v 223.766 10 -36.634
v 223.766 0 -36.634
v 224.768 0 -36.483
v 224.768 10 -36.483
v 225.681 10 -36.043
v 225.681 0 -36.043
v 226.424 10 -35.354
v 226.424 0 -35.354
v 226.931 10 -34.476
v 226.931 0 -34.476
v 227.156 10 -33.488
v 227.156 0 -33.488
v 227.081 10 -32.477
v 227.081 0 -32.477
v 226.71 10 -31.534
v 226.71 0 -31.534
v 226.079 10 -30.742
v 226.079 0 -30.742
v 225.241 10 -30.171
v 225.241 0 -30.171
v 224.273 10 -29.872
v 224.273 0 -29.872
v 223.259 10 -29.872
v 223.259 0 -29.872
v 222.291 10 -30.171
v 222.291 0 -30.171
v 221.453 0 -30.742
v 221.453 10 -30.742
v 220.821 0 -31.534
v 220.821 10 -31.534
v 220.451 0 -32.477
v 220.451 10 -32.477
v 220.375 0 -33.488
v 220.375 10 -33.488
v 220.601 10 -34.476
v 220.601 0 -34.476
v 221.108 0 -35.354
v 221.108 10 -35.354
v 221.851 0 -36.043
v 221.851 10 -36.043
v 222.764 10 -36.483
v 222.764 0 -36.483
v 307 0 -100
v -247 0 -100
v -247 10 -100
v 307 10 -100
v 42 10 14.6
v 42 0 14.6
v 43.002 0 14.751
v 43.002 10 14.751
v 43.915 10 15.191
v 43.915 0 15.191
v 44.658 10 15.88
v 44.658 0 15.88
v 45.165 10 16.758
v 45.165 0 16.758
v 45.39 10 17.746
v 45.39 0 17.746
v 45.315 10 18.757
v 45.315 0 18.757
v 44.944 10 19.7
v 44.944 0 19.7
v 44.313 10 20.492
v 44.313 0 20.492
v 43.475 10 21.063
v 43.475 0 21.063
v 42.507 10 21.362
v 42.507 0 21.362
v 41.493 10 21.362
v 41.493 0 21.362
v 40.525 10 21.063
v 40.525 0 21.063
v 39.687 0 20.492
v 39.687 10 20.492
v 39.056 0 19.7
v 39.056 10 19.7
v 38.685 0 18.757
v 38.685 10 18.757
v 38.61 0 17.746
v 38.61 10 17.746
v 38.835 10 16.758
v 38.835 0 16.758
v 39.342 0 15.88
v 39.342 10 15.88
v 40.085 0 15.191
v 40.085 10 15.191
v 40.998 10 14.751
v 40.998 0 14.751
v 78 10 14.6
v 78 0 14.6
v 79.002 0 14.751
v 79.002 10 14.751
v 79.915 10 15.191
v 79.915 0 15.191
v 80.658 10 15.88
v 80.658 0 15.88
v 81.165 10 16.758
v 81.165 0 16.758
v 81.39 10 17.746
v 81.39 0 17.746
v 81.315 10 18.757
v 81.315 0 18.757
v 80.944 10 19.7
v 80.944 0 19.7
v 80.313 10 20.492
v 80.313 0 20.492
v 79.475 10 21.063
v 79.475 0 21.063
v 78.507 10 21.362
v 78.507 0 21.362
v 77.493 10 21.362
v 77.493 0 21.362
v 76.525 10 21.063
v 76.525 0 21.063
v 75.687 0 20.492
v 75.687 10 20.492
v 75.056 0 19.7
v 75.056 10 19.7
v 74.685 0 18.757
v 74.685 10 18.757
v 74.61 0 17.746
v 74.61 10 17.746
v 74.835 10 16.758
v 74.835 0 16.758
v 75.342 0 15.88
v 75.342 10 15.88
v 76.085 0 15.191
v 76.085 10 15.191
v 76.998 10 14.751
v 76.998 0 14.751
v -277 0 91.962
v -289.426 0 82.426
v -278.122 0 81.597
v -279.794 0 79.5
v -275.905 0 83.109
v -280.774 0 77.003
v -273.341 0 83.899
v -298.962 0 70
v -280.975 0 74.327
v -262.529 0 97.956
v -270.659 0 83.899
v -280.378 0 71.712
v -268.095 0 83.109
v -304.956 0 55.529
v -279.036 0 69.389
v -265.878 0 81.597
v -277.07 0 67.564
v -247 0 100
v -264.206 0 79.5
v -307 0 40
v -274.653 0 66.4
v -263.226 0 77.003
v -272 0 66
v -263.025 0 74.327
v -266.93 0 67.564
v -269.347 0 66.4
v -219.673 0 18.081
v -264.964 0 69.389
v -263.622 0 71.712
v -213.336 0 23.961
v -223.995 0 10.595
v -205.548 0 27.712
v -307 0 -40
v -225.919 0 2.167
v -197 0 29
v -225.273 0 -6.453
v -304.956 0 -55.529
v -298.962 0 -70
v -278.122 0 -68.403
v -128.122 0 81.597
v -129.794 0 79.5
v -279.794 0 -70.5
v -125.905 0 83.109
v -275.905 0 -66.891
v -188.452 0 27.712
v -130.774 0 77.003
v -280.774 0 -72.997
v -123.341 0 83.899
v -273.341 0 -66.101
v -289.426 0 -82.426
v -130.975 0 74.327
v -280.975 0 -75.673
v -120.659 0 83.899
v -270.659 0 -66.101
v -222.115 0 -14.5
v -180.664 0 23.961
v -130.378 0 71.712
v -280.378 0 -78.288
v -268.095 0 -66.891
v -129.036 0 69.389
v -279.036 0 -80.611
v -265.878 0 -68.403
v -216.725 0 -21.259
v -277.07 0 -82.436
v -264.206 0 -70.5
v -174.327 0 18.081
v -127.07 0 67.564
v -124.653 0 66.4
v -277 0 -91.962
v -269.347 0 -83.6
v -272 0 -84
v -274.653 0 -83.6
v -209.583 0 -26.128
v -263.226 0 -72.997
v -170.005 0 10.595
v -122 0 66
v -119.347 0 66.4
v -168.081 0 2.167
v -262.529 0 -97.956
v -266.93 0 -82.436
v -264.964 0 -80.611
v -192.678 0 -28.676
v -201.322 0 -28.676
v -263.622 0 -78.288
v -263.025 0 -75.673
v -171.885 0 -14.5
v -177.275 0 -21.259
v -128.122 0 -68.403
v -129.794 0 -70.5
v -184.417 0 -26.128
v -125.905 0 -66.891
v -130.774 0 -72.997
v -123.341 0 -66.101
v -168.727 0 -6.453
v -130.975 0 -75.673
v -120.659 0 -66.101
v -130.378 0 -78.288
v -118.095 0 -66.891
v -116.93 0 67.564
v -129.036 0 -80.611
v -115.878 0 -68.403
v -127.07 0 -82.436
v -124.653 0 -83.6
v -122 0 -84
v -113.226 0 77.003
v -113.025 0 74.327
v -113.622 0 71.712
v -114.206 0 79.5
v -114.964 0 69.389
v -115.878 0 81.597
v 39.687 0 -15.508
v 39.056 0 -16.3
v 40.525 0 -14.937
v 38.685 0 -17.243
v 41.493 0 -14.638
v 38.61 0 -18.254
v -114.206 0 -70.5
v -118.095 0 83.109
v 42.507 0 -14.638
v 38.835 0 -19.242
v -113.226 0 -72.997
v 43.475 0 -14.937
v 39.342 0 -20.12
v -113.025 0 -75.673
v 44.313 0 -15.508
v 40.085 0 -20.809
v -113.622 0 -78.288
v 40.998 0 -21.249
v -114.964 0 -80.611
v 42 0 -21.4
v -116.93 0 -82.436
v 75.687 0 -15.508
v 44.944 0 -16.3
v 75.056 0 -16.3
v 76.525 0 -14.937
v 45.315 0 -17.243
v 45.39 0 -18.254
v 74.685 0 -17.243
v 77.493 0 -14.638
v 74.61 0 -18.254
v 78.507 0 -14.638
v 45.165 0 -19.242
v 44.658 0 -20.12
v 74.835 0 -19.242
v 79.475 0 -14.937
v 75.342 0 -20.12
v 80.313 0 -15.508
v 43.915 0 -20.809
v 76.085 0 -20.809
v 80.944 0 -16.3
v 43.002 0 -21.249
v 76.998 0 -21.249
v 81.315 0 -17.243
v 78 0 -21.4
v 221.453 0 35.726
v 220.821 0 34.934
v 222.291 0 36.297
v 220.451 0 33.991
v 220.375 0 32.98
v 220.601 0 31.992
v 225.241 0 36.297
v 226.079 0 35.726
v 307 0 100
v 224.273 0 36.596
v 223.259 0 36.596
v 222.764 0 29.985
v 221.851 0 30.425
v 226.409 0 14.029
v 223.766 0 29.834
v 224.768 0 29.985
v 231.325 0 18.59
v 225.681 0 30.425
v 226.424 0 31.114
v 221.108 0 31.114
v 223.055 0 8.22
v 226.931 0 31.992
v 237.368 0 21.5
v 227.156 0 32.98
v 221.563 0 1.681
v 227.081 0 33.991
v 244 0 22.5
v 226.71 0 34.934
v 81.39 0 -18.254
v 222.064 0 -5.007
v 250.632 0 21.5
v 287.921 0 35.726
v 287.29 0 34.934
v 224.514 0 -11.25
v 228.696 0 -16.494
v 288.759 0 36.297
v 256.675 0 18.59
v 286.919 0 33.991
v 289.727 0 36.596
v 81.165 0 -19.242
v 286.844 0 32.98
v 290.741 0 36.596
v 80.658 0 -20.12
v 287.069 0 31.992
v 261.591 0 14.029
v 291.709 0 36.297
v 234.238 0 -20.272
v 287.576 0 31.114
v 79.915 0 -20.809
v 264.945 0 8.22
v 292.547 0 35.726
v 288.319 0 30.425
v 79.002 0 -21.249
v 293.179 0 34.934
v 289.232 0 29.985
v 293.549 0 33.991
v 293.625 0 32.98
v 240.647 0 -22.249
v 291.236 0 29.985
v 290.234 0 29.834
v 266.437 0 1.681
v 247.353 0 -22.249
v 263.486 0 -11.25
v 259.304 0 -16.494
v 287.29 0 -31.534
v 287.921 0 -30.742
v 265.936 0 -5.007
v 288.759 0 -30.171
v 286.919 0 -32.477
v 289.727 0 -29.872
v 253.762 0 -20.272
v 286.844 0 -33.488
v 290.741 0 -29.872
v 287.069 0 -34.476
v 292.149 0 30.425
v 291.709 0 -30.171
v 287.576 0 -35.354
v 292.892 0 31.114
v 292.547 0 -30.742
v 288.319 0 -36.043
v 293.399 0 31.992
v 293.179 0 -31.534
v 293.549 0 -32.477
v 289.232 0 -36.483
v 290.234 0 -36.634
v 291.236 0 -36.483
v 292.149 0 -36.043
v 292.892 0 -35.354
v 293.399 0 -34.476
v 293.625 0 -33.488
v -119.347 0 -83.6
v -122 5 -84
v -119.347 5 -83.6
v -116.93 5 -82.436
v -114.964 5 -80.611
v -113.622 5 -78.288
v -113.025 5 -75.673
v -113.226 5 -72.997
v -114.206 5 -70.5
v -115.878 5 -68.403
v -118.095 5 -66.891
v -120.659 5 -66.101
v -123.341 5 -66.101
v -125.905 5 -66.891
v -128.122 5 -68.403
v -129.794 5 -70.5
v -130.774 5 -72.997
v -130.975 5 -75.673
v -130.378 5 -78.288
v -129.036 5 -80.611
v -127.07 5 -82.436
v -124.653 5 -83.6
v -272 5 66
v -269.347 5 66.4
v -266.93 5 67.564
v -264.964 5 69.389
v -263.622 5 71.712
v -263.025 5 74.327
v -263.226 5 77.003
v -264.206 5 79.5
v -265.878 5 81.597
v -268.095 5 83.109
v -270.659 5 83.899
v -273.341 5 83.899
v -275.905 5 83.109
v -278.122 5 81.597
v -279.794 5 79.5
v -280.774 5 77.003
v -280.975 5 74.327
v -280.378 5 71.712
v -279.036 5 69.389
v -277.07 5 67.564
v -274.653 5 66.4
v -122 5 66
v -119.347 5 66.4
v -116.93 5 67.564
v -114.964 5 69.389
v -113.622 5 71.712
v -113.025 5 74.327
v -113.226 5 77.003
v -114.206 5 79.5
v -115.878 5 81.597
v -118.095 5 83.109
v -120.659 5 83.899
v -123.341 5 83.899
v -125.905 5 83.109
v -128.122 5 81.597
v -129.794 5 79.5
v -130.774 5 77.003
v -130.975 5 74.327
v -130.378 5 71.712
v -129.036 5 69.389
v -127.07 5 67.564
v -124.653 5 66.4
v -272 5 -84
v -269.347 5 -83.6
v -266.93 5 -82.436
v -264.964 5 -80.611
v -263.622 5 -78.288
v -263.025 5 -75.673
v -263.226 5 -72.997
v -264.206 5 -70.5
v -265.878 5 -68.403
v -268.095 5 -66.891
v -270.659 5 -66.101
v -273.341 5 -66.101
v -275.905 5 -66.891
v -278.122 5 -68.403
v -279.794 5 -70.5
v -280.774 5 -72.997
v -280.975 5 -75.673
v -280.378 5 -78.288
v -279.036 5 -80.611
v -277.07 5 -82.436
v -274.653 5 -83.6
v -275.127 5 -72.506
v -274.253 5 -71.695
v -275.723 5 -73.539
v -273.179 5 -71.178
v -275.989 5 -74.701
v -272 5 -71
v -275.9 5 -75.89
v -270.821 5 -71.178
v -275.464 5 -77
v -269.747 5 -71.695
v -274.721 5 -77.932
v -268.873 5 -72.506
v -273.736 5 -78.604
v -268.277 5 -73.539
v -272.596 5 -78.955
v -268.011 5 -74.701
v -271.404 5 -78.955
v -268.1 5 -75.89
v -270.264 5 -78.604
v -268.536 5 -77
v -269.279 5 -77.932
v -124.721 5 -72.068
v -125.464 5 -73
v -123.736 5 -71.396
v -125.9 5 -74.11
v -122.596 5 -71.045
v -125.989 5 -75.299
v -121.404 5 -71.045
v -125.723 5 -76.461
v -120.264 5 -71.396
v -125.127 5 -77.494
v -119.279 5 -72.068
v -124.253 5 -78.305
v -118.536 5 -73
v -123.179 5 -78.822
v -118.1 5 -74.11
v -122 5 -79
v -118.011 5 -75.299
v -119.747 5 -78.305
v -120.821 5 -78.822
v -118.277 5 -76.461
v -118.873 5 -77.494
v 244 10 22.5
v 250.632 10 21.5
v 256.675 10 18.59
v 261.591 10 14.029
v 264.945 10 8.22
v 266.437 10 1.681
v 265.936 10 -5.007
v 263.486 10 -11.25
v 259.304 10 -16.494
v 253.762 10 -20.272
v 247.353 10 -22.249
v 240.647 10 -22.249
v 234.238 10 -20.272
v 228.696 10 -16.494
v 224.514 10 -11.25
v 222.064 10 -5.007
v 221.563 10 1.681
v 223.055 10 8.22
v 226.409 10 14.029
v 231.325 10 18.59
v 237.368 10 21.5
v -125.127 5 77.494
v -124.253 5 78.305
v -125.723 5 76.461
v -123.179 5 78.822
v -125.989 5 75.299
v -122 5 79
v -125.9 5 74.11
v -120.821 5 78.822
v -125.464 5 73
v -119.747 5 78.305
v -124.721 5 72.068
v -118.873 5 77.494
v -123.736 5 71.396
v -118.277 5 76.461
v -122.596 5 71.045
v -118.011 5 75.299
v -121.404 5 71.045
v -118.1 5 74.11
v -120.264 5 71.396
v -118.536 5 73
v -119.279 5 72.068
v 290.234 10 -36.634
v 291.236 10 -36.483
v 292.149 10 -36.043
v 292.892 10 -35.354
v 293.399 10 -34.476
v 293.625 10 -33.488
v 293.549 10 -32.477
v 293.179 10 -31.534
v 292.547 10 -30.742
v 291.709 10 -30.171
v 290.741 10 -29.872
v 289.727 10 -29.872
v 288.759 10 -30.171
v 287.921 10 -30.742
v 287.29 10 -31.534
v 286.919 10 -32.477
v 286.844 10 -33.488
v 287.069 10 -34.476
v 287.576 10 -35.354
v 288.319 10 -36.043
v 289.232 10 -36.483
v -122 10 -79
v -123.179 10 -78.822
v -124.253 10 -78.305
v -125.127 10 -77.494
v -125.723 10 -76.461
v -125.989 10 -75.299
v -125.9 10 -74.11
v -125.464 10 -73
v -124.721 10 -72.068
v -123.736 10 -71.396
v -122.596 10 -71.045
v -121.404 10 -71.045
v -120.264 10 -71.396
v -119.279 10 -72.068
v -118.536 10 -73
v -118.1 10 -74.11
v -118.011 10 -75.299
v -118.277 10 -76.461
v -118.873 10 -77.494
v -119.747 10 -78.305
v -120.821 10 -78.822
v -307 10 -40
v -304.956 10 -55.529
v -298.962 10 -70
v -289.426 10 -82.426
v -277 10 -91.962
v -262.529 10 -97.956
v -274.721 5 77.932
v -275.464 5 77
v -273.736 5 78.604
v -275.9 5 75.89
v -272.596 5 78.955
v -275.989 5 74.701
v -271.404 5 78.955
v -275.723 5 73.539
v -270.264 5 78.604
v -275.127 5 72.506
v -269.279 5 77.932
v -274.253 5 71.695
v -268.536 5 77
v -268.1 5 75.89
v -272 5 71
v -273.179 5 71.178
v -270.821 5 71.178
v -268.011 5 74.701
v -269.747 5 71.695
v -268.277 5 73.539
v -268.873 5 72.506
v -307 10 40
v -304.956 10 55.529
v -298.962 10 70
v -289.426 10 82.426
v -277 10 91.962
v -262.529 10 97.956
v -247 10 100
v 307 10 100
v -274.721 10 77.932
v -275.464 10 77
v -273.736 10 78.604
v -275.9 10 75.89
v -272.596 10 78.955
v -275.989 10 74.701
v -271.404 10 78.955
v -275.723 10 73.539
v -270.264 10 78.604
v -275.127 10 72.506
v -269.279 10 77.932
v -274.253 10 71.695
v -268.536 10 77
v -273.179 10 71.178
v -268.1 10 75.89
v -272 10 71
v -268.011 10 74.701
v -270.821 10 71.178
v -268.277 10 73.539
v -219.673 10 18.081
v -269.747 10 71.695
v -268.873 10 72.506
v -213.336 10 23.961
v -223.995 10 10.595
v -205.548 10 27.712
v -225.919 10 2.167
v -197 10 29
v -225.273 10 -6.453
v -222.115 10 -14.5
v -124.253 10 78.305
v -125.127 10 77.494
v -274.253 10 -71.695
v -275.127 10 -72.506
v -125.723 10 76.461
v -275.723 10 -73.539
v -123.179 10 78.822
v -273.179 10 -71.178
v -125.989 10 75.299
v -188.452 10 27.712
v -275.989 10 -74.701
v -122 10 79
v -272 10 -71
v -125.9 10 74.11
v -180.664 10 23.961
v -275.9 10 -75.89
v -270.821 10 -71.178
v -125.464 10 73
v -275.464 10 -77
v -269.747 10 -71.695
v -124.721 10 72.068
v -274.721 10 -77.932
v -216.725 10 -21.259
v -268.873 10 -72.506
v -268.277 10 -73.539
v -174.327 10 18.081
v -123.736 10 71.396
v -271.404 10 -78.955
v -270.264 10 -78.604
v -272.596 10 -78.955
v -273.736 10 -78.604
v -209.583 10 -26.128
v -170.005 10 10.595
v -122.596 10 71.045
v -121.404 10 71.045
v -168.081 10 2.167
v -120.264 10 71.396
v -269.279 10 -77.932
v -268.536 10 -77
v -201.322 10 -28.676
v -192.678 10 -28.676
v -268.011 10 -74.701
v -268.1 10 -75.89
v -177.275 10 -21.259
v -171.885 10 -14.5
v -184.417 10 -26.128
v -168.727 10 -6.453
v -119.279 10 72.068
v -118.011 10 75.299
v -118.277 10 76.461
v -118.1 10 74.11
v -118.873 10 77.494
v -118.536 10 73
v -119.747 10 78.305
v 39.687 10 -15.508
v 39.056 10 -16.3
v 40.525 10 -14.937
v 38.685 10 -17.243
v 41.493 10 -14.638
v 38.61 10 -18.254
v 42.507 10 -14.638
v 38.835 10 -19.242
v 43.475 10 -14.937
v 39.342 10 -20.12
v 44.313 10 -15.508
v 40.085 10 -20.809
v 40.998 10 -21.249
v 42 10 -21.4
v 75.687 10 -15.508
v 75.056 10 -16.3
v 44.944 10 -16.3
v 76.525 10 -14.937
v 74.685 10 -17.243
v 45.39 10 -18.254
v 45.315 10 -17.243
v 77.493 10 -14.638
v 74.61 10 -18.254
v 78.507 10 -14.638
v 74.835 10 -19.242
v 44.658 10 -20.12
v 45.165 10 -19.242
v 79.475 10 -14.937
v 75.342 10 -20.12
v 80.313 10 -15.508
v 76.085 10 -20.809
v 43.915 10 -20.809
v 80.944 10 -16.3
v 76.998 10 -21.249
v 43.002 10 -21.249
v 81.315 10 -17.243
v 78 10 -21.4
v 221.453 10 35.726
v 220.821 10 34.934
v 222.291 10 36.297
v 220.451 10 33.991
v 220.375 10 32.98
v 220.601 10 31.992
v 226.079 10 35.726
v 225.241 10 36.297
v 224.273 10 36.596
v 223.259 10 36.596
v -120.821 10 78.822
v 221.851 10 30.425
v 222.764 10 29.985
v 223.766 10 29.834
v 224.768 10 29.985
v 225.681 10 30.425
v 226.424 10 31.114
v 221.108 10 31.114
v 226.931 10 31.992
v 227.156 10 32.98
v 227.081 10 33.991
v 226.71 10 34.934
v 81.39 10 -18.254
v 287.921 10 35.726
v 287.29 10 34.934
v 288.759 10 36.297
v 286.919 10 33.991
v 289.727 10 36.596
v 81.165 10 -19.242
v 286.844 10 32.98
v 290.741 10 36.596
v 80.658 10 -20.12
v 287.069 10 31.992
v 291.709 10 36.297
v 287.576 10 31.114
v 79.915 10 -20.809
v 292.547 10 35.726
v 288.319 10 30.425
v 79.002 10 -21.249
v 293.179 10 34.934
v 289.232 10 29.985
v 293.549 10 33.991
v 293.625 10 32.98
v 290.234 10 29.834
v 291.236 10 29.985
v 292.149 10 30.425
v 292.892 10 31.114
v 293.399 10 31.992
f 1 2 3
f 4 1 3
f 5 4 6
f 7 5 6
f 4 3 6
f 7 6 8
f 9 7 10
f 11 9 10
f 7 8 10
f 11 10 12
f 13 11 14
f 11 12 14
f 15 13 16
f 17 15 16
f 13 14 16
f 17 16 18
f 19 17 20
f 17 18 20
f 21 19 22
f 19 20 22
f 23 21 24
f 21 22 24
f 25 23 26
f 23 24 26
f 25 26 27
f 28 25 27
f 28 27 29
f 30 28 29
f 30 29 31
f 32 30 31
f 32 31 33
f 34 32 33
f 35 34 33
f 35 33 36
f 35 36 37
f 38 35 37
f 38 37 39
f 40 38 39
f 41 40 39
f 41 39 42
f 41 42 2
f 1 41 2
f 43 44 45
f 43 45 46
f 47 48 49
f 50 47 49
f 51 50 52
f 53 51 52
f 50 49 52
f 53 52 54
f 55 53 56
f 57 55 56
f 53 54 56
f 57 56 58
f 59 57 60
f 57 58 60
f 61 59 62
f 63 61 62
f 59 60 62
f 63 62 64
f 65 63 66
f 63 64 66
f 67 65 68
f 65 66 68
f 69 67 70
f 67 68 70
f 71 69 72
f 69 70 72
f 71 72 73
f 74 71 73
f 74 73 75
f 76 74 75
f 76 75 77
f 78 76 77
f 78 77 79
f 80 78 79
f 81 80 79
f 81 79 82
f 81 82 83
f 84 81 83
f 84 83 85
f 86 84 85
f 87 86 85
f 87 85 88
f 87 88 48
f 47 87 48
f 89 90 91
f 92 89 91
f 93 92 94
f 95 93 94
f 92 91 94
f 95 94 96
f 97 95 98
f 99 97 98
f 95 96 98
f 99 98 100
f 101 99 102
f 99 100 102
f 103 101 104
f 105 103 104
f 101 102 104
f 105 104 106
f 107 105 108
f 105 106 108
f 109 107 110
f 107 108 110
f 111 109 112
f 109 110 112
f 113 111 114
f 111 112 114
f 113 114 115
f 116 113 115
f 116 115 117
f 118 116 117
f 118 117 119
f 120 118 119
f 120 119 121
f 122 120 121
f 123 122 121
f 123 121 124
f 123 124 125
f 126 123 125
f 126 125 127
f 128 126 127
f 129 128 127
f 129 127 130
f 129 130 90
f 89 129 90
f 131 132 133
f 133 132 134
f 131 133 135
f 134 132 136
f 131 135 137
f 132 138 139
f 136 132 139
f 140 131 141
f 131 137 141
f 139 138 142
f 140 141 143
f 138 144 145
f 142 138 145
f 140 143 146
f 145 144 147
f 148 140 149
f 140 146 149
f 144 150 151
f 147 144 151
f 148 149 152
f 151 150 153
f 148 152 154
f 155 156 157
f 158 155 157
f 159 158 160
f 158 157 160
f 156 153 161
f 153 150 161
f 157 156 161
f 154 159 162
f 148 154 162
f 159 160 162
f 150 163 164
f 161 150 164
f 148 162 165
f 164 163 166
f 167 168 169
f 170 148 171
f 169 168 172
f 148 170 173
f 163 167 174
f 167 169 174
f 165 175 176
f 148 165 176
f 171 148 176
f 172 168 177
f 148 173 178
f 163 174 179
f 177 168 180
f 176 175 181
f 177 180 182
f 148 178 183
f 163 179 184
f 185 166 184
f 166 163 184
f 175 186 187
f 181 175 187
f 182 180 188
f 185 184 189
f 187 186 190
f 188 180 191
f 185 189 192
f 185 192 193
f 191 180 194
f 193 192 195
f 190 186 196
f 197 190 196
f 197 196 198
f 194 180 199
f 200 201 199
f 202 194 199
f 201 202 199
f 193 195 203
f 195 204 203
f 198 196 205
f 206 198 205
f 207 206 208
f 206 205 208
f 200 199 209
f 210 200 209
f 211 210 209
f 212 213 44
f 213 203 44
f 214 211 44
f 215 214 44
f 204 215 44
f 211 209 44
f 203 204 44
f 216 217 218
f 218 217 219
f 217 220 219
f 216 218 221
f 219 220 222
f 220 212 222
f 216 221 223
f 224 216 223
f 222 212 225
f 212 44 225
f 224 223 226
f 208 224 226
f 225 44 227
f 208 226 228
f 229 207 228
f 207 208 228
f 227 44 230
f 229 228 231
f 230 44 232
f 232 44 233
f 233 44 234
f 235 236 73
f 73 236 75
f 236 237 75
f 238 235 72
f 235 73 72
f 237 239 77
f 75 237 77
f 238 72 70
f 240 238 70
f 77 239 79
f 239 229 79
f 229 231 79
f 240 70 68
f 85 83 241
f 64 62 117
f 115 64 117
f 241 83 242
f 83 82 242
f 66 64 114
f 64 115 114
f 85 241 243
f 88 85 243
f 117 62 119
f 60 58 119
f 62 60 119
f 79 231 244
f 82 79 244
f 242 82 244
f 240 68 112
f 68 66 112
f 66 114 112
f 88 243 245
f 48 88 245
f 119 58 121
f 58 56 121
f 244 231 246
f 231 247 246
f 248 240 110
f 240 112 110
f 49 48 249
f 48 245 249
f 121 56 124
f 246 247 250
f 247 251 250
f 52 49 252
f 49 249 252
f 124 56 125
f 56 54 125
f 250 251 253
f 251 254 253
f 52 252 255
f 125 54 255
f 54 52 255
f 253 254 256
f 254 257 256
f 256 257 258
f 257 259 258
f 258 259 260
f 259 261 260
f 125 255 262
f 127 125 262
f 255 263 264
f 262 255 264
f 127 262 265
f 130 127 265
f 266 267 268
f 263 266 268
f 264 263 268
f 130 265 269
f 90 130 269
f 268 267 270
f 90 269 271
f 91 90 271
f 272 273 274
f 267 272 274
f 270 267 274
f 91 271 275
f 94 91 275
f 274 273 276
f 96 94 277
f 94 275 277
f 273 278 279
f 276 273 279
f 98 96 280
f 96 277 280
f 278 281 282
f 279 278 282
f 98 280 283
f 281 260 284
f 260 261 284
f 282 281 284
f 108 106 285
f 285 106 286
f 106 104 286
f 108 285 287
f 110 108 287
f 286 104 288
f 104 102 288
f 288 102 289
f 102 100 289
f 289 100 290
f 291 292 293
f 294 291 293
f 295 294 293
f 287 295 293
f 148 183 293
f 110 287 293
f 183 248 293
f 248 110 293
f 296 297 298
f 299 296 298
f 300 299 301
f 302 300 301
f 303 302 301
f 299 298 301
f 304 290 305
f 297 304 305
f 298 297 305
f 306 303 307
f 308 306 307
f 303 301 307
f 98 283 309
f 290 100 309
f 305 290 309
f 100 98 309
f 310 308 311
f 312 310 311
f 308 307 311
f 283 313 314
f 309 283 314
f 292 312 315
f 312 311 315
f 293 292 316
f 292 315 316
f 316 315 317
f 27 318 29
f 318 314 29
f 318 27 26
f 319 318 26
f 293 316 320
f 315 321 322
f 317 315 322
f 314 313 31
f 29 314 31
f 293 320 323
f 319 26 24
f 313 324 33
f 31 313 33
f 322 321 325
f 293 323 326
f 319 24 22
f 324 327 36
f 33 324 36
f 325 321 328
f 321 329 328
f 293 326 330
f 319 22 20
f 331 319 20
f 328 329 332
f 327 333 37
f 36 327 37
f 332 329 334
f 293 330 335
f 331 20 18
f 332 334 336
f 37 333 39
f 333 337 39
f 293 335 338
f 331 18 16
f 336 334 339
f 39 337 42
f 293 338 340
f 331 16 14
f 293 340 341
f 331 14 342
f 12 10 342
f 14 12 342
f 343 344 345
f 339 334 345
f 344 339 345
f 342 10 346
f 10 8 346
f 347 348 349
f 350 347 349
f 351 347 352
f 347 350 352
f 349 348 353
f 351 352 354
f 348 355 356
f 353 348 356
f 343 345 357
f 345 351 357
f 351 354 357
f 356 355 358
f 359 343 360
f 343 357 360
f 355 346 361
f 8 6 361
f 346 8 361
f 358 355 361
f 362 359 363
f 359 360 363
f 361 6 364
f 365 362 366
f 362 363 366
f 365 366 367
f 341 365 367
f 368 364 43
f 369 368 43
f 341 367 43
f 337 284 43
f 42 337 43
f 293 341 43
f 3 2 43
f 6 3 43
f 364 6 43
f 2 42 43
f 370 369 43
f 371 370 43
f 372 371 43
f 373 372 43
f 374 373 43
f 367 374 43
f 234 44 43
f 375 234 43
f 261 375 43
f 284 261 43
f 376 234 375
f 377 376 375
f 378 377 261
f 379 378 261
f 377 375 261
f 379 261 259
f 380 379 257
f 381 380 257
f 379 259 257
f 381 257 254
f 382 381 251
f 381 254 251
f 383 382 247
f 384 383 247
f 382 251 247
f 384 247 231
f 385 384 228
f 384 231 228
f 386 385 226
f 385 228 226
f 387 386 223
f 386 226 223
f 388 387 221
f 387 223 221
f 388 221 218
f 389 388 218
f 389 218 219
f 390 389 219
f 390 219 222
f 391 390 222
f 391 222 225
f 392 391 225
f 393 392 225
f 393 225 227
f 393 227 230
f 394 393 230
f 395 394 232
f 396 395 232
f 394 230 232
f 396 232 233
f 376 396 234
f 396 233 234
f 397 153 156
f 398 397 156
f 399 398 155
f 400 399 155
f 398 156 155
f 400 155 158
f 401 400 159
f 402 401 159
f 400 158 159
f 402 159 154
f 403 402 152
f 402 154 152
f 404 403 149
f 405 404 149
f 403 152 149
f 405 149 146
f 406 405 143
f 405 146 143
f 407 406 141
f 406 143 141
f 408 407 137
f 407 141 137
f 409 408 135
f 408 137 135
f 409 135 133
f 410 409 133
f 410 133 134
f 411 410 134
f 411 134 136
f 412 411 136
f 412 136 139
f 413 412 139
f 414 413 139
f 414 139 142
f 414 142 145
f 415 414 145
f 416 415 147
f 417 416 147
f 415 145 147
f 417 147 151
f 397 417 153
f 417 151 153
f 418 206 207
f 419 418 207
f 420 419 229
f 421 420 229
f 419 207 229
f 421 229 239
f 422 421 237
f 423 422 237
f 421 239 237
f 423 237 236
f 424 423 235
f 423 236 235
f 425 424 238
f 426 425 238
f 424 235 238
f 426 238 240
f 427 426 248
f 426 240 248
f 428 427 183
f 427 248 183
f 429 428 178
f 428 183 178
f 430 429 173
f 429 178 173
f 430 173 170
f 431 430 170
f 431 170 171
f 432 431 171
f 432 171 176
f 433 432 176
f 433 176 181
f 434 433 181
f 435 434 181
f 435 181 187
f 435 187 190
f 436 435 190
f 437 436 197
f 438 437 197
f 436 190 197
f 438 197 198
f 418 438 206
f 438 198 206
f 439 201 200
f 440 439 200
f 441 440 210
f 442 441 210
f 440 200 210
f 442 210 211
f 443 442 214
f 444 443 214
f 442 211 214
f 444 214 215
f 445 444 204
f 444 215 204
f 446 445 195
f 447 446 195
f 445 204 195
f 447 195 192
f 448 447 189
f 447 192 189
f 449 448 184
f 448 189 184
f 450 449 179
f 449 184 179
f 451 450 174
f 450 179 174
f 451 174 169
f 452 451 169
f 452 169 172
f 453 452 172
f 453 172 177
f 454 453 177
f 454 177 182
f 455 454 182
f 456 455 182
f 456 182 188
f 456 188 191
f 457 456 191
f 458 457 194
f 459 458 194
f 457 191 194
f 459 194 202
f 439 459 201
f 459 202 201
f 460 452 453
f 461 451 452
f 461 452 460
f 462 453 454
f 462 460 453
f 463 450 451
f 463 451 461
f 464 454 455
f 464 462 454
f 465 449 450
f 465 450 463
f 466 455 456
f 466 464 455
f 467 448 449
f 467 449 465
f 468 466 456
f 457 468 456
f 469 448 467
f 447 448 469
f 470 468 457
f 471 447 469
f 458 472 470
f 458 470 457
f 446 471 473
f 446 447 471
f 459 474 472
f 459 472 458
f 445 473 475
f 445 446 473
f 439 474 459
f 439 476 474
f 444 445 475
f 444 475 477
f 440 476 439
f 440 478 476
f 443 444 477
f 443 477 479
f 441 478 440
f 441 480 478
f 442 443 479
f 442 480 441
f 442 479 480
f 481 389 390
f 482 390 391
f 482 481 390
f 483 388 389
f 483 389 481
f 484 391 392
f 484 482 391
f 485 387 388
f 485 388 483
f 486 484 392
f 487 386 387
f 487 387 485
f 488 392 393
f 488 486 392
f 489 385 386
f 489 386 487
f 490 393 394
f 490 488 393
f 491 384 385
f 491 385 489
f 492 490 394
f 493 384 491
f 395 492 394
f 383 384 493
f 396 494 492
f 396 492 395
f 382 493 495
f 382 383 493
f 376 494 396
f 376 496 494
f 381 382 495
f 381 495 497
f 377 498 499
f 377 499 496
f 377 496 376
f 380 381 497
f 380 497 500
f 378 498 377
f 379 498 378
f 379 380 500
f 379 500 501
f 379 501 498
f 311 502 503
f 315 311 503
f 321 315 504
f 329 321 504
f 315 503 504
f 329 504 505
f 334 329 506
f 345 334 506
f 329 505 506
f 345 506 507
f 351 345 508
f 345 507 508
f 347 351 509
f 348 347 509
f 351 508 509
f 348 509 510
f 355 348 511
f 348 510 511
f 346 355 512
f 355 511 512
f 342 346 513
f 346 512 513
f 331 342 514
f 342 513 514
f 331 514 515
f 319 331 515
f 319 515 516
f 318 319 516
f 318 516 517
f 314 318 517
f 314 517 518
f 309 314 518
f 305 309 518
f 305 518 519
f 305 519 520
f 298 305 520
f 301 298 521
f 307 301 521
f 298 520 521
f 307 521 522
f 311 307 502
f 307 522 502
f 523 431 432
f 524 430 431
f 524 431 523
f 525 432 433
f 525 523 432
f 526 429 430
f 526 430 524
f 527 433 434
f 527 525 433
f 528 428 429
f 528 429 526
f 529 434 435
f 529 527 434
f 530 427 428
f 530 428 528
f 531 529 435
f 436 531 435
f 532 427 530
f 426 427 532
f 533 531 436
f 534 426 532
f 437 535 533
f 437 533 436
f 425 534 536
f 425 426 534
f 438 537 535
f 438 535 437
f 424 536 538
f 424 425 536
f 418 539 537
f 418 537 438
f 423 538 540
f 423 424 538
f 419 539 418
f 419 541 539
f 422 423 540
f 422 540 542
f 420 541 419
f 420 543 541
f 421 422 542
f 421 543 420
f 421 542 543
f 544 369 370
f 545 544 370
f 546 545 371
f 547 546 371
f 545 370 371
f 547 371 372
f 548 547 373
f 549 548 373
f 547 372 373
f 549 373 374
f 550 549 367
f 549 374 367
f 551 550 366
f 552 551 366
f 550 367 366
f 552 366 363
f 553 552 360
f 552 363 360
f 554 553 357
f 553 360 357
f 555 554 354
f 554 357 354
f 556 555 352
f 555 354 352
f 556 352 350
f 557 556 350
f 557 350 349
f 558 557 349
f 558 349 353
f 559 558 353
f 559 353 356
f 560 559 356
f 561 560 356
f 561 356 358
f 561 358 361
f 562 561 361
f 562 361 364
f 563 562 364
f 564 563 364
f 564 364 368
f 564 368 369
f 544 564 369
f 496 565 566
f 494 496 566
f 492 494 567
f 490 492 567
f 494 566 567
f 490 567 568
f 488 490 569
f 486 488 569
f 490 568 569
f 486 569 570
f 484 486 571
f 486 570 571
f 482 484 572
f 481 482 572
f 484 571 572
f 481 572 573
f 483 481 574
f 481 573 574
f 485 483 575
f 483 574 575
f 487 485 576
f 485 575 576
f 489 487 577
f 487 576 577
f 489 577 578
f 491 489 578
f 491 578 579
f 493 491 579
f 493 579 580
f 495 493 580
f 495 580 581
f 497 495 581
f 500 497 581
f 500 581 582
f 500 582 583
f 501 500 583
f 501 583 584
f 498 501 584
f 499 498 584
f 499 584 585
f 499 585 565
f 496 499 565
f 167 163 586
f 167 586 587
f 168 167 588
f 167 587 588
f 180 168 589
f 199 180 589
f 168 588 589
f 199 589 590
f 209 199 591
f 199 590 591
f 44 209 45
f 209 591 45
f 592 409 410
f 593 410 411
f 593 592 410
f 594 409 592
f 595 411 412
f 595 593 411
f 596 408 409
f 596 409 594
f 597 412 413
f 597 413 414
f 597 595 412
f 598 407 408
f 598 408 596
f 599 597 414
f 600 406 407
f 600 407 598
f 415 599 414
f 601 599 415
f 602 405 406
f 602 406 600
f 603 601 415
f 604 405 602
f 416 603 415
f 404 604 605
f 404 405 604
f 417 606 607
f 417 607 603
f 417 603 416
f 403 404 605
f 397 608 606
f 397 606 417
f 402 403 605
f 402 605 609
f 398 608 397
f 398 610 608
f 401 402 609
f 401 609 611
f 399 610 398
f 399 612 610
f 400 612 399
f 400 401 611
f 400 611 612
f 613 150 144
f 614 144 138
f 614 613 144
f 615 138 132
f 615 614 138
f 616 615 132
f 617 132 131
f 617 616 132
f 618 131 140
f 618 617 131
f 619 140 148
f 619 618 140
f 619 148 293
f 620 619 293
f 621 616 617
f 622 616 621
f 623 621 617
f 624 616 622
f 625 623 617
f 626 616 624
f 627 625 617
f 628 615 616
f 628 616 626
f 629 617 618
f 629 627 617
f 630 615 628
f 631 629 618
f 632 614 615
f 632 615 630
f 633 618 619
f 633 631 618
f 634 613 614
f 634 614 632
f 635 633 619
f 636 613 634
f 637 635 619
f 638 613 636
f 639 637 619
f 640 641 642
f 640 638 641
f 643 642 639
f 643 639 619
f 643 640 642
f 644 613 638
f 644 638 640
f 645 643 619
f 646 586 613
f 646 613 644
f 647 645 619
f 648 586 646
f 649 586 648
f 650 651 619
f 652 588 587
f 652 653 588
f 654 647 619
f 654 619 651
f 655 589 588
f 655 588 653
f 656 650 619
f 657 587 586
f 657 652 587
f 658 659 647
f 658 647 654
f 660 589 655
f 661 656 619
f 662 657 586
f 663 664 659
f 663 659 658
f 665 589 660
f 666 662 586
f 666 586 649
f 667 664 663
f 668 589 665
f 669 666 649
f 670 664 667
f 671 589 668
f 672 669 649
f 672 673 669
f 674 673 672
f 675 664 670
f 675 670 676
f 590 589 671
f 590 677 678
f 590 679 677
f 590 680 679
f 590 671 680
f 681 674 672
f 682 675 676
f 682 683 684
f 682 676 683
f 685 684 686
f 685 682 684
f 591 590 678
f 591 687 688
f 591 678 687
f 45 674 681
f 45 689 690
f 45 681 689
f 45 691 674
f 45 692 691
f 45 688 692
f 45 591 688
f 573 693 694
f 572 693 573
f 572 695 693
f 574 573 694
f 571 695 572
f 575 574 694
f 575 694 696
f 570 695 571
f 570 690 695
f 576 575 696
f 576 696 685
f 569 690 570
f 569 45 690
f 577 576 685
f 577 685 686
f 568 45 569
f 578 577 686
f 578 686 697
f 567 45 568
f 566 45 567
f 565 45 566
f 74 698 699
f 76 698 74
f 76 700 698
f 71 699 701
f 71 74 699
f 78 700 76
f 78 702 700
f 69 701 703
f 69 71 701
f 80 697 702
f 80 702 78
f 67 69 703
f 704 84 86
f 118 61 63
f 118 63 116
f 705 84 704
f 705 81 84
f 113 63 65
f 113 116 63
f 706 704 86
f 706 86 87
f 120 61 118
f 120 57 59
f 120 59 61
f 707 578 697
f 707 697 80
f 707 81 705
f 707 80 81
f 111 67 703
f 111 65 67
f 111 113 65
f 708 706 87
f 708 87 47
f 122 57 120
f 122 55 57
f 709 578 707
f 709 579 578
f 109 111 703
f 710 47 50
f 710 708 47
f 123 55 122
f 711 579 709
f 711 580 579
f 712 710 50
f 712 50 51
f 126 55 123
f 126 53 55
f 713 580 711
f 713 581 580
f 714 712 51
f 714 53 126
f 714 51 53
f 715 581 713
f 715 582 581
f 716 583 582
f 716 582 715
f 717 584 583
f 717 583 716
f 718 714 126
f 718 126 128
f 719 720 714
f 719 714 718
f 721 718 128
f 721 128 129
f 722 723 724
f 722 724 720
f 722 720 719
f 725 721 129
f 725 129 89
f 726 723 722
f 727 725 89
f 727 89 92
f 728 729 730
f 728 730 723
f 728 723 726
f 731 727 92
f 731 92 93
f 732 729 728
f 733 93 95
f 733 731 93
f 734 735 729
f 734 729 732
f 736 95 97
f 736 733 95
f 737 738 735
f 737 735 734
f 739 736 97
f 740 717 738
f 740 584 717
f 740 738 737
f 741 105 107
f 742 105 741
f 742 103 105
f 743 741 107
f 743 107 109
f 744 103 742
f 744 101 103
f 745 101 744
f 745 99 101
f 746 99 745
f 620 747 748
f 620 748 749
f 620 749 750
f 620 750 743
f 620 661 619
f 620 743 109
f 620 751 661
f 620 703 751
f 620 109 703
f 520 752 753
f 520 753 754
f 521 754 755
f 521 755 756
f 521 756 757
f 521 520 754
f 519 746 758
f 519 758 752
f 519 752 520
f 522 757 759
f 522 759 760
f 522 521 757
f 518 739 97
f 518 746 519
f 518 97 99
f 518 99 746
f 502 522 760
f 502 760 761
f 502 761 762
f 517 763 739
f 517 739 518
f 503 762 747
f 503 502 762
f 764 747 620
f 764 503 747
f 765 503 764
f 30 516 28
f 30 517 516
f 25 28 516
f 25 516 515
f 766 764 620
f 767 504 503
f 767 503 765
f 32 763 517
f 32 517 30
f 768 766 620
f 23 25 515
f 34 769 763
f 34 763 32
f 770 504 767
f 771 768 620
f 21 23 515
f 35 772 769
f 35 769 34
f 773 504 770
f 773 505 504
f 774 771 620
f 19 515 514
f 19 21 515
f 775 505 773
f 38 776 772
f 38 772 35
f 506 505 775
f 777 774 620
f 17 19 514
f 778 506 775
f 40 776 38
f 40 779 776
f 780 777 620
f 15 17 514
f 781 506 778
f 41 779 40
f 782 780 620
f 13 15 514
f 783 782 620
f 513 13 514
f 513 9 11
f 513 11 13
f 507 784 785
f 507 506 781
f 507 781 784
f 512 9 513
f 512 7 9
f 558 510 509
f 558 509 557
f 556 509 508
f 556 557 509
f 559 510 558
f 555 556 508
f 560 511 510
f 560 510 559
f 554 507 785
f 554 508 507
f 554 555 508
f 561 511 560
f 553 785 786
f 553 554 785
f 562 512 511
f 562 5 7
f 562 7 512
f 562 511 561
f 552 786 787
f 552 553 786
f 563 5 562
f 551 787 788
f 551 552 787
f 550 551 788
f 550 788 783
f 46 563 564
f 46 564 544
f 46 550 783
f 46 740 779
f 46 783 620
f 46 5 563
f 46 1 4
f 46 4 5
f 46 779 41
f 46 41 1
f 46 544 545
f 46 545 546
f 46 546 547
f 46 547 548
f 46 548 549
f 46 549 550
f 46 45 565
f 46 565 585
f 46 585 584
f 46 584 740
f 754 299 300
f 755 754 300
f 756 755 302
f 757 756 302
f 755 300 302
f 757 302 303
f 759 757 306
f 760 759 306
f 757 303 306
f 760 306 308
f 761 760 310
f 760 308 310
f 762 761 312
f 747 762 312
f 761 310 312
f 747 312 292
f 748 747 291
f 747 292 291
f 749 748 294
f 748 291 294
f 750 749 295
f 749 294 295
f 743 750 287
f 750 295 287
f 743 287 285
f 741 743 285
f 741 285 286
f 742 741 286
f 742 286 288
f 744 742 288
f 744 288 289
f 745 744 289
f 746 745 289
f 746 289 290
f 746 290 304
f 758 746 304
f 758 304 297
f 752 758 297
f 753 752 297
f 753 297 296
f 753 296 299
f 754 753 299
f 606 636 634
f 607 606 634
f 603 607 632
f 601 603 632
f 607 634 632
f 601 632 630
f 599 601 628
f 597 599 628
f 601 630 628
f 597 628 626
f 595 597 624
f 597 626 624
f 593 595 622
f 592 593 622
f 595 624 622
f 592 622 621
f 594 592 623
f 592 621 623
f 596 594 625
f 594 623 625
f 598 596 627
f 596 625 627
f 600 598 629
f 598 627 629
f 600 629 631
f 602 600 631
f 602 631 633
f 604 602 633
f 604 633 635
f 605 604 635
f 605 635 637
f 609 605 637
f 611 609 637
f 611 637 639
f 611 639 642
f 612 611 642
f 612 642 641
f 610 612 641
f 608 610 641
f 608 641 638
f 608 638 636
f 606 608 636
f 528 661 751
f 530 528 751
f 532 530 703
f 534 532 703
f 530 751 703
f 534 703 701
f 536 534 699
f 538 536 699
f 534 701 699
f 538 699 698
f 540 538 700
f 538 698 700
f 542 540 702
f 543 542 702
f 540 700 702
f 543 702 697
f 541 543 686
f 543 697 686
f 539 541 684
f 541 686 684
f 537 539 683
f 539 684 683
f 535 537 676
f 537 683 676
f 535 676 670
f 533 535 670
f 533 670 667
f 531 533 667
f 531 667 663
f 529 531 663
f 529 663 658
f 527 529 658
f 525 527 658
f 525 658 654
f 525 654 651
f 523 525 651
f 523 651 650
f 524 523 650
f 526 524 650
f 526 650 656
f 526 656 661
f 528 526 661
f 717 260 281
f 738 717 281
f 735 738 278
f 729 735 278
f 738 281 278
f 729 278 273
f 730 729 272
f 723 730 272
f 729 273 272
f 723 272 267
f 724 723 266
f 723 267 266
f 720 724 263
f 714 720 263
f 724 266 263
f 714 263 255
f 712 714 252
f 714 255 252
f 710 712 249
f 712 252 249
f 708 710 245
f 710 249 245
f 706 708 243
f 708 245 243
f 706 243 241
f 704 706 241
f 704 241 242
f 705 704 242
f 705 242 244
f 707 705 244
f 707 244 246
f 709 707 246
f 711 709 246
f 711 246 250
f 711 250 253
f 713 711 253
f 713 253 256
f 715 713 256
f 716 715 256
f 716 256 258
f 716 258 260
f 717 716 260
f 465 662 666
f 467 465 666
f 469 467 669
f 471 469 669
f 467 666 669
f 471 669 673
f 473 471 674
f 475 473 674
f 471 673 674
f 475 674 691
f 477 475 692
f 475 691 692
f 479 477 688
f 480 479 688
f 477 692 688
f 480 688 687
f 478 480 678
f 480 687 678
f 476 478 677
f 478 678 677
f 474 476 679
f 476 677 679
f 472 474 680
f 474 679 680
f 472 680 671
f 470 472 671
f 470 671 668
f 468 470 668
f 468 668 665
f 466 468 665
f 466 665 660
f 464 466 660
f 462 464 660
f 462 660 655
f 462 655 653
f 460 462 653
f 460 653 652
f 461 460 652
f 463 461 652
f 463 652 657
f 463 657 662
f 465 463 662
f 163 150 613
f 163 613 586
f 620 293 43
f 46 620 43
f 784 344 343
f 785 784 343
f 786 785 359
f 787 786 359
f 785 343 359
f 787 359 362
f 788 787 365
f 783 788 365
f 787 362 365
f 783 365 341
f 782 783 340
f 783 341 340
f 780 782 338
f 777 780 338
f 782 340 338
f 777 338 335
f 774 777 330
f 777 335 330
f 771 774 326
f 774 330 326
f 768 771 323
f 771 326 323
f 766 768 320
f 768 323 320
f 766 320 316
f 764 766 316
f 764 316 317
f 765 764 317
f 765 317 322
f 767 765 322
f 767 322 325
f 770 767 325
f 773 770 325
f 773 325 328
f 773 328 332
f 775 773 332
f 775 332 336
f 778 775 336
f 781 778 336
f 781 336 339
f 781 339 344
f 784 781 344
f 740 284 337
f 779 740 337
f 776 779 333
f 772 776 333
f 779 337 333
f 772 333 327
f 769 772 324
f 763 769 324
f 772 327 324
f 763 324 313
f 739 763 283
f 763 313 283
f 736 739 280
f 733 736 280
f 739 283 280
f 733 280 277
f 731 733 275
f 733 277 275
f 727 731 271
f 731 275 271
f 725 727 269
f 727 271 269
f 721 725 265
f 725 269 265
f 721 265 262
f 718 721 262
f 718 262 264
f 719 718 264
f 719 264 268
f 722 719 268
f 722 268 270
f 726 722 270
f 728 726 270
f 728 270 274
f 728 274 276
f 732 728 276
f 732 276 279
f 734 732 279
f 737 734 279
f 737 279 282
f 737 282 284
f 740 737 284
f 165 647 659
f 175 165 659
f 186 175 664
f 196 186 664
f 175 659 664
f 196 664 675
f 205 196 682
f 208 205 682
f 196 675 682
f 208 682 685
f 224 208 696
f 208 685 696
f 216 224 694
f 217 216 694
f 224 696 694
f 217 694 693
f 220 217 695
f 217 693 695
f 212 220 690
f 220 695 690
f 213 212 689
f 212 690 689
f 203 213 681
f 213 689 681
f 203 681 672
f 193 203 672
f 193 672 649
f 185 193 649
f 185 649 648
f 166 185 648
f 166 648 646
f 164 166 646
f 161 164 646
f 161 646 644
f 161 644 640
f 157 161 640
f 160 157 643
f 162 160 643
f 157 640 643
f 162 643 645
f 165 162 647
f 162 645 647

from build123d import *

# Parameters (mm, degrees)
SKETCH1_W             = 614
SKETCH1_H             = 200
EXTRUDE1_DEPTH        = 10
SKETCH2_R             = 29
SKETCH2_R_2           = 4
EXTRUDE2_DEPTH        = 10
M8_TAPPED_HOLE2_D     = 6.8
M8_TAPPED_HOLE2_DEPTH = 19.75
M8_TAPPED_HOLE2_TIP   = 2.042926105
SKETCH6_R             = 22.5
EXTRUDE3_DEPTH        = 10
SKETCH7_R             = 9
EXTRUDE4_DEPTH        = 5
LPATTERN1_COUNT       = 2
LPATTERN1_PITCH       = 150
LPATTERN1_COUNT_DIR2  = 2
LPATTERN1_PITCH_DIR2  = 150
M8_TAPPED_HOLE3_D     = 6.8
M8_TAPPED_HOLE3_DEPTH = 19.75
M8_TAPPED_HOLE3_TIP   = 2.042926105
FILLET1_R             = 60


with BuildPart() as part:
    # Sketch1 → Extrude1 (new body)
    with BuildSketch(Plane(origin=(0, 0, 0), x_dir=(1, 0, 0), z_dir=(0, 1, 0))):
        Rectangle(SKETCH1_W, SKETCH1_H)
    extrude(amount=EXTRUDE1_DEPTH)

    # Sketch2 → Extrude2 (cut)
    with BuildSketch(Plane(origin=(0, 10, 0), x_dir=(1, 0, 0), z_dir=(0, 1, 0))):
        with Locations(Location((-197, 0, 0), (0, 0, 270))):
            Circle(SKETCH2_R)
        with Locations(Location((-272, 75, 0), (0, 0, 270))):
            Circle(SKETCH2_R_2)
        with Locations(Location((-122, 75, 0), (0, 0, 90))):
            Circle(SKETCH2_R_2)
        with Locations(Location((-122, -75, 0), (0, 0, 270))):
            Circle(SKETCH2_R_2)
        with Locations(Location((-272, -75, 0), (0, 0, 90))):
            Circle(SKETCH2_R_2)
    extrude(amount=-EXTRUDE2_DEPTH, mode=Mode.SUBTRACT)

    # M8 Tapped Hole2
    with Locations(Plane(origin=(223.765981284, 10, -33.234018716), x_dir=(0, 0, 1), z_dir=(0, 1, 0))):
        with Locations((0, 0), (0, 66.468037432), (66.468037432, 0), (66.468037432, 66.468037432)):
            Hole(M8_TAPPED_HOLE2_D / 2, depth=M8_TAPPED_HOLE2_DEPTH)
            with Locations((0, 0, -(M8_TAPPED_HOLE2_DEPTH + M8_TAPPED_HOLE2_TIP / 2))):  # 118° drill point
                Cone(0, M8_TAPPED_HOLE2_D / 2, M8_TAPPED_HOLE2_TIP, mode=Mode.SUBTRACT)

    # Sketch6 → Extrude3 (cut)
    with BuildSketch(Plane(origin=(0, 10, 0), x_dir=(1, 0, 0), z_dir=(0, 1, 0))):
        with Locations(Location((244, 0, 0), (0, 0, 270))):
            Circle(SKETCH6_R)
    extrude(amount=-EXTRUDE3_DEPTH, mode=Mode.SUBTRACT)

    # Sketch7 → Extrude4 (cut)
    with BuildSketch(Plane.XZ):
        with Locations(Location((-272, 75, 0), (0, 0, 270))):
            Circle(SKETCH7_R)
    extrude4 = extrude(amount=-EXTRUDE4_DEPTH, mode=Mode.SUBTRACT)

    # LPattern1: Extrude4 2 × 2
    with Locations(*[(i * LPATTERN1_PITCH, 0, -j * LPATTERN1_PITCH_DIR2) for i in range(LPATTERN1_COUNT) for j in range(LPATTERN1_COUNT_DIR2) if (i, j) != (0, 0)]):
        add(extrude4, mode=Mode.SUBTRACT)

    # M8 Tapped Hole3
    with Locations(Plane(origin=(42, 10, -18), x_dir=(0, 0, 1), z_dir=(0, 1, 0))):
        with Locations((0, 0), (0, 36), (36, 0), (36, 36)):
            Hole(M8_TAPPED_HOLE3_D / 2, depth=M8_TAPPED_HOLE3_DEPTH)
            with Locations((0, 0, -(M8_TAPPED_HOLE3_DEPTH + M8_TAPPED_HOLE3_TIP / 2))):  # 118° drill point
                Cone(0, M8_TAPPED_HOLE3_D / 2, M8_TAPPED_HOLE3_TIP, mode=Mode.SUBTRACT)

    # Fillet1
    fillet1_edges = [part.edges().sort_by_distance(p)[0] for p in [
        (-307, 5, -100),
        (-307, 5, 100),
    ]]
    fillet(fillet1_edges, radius=FILLET1_R)


solid = part.part
